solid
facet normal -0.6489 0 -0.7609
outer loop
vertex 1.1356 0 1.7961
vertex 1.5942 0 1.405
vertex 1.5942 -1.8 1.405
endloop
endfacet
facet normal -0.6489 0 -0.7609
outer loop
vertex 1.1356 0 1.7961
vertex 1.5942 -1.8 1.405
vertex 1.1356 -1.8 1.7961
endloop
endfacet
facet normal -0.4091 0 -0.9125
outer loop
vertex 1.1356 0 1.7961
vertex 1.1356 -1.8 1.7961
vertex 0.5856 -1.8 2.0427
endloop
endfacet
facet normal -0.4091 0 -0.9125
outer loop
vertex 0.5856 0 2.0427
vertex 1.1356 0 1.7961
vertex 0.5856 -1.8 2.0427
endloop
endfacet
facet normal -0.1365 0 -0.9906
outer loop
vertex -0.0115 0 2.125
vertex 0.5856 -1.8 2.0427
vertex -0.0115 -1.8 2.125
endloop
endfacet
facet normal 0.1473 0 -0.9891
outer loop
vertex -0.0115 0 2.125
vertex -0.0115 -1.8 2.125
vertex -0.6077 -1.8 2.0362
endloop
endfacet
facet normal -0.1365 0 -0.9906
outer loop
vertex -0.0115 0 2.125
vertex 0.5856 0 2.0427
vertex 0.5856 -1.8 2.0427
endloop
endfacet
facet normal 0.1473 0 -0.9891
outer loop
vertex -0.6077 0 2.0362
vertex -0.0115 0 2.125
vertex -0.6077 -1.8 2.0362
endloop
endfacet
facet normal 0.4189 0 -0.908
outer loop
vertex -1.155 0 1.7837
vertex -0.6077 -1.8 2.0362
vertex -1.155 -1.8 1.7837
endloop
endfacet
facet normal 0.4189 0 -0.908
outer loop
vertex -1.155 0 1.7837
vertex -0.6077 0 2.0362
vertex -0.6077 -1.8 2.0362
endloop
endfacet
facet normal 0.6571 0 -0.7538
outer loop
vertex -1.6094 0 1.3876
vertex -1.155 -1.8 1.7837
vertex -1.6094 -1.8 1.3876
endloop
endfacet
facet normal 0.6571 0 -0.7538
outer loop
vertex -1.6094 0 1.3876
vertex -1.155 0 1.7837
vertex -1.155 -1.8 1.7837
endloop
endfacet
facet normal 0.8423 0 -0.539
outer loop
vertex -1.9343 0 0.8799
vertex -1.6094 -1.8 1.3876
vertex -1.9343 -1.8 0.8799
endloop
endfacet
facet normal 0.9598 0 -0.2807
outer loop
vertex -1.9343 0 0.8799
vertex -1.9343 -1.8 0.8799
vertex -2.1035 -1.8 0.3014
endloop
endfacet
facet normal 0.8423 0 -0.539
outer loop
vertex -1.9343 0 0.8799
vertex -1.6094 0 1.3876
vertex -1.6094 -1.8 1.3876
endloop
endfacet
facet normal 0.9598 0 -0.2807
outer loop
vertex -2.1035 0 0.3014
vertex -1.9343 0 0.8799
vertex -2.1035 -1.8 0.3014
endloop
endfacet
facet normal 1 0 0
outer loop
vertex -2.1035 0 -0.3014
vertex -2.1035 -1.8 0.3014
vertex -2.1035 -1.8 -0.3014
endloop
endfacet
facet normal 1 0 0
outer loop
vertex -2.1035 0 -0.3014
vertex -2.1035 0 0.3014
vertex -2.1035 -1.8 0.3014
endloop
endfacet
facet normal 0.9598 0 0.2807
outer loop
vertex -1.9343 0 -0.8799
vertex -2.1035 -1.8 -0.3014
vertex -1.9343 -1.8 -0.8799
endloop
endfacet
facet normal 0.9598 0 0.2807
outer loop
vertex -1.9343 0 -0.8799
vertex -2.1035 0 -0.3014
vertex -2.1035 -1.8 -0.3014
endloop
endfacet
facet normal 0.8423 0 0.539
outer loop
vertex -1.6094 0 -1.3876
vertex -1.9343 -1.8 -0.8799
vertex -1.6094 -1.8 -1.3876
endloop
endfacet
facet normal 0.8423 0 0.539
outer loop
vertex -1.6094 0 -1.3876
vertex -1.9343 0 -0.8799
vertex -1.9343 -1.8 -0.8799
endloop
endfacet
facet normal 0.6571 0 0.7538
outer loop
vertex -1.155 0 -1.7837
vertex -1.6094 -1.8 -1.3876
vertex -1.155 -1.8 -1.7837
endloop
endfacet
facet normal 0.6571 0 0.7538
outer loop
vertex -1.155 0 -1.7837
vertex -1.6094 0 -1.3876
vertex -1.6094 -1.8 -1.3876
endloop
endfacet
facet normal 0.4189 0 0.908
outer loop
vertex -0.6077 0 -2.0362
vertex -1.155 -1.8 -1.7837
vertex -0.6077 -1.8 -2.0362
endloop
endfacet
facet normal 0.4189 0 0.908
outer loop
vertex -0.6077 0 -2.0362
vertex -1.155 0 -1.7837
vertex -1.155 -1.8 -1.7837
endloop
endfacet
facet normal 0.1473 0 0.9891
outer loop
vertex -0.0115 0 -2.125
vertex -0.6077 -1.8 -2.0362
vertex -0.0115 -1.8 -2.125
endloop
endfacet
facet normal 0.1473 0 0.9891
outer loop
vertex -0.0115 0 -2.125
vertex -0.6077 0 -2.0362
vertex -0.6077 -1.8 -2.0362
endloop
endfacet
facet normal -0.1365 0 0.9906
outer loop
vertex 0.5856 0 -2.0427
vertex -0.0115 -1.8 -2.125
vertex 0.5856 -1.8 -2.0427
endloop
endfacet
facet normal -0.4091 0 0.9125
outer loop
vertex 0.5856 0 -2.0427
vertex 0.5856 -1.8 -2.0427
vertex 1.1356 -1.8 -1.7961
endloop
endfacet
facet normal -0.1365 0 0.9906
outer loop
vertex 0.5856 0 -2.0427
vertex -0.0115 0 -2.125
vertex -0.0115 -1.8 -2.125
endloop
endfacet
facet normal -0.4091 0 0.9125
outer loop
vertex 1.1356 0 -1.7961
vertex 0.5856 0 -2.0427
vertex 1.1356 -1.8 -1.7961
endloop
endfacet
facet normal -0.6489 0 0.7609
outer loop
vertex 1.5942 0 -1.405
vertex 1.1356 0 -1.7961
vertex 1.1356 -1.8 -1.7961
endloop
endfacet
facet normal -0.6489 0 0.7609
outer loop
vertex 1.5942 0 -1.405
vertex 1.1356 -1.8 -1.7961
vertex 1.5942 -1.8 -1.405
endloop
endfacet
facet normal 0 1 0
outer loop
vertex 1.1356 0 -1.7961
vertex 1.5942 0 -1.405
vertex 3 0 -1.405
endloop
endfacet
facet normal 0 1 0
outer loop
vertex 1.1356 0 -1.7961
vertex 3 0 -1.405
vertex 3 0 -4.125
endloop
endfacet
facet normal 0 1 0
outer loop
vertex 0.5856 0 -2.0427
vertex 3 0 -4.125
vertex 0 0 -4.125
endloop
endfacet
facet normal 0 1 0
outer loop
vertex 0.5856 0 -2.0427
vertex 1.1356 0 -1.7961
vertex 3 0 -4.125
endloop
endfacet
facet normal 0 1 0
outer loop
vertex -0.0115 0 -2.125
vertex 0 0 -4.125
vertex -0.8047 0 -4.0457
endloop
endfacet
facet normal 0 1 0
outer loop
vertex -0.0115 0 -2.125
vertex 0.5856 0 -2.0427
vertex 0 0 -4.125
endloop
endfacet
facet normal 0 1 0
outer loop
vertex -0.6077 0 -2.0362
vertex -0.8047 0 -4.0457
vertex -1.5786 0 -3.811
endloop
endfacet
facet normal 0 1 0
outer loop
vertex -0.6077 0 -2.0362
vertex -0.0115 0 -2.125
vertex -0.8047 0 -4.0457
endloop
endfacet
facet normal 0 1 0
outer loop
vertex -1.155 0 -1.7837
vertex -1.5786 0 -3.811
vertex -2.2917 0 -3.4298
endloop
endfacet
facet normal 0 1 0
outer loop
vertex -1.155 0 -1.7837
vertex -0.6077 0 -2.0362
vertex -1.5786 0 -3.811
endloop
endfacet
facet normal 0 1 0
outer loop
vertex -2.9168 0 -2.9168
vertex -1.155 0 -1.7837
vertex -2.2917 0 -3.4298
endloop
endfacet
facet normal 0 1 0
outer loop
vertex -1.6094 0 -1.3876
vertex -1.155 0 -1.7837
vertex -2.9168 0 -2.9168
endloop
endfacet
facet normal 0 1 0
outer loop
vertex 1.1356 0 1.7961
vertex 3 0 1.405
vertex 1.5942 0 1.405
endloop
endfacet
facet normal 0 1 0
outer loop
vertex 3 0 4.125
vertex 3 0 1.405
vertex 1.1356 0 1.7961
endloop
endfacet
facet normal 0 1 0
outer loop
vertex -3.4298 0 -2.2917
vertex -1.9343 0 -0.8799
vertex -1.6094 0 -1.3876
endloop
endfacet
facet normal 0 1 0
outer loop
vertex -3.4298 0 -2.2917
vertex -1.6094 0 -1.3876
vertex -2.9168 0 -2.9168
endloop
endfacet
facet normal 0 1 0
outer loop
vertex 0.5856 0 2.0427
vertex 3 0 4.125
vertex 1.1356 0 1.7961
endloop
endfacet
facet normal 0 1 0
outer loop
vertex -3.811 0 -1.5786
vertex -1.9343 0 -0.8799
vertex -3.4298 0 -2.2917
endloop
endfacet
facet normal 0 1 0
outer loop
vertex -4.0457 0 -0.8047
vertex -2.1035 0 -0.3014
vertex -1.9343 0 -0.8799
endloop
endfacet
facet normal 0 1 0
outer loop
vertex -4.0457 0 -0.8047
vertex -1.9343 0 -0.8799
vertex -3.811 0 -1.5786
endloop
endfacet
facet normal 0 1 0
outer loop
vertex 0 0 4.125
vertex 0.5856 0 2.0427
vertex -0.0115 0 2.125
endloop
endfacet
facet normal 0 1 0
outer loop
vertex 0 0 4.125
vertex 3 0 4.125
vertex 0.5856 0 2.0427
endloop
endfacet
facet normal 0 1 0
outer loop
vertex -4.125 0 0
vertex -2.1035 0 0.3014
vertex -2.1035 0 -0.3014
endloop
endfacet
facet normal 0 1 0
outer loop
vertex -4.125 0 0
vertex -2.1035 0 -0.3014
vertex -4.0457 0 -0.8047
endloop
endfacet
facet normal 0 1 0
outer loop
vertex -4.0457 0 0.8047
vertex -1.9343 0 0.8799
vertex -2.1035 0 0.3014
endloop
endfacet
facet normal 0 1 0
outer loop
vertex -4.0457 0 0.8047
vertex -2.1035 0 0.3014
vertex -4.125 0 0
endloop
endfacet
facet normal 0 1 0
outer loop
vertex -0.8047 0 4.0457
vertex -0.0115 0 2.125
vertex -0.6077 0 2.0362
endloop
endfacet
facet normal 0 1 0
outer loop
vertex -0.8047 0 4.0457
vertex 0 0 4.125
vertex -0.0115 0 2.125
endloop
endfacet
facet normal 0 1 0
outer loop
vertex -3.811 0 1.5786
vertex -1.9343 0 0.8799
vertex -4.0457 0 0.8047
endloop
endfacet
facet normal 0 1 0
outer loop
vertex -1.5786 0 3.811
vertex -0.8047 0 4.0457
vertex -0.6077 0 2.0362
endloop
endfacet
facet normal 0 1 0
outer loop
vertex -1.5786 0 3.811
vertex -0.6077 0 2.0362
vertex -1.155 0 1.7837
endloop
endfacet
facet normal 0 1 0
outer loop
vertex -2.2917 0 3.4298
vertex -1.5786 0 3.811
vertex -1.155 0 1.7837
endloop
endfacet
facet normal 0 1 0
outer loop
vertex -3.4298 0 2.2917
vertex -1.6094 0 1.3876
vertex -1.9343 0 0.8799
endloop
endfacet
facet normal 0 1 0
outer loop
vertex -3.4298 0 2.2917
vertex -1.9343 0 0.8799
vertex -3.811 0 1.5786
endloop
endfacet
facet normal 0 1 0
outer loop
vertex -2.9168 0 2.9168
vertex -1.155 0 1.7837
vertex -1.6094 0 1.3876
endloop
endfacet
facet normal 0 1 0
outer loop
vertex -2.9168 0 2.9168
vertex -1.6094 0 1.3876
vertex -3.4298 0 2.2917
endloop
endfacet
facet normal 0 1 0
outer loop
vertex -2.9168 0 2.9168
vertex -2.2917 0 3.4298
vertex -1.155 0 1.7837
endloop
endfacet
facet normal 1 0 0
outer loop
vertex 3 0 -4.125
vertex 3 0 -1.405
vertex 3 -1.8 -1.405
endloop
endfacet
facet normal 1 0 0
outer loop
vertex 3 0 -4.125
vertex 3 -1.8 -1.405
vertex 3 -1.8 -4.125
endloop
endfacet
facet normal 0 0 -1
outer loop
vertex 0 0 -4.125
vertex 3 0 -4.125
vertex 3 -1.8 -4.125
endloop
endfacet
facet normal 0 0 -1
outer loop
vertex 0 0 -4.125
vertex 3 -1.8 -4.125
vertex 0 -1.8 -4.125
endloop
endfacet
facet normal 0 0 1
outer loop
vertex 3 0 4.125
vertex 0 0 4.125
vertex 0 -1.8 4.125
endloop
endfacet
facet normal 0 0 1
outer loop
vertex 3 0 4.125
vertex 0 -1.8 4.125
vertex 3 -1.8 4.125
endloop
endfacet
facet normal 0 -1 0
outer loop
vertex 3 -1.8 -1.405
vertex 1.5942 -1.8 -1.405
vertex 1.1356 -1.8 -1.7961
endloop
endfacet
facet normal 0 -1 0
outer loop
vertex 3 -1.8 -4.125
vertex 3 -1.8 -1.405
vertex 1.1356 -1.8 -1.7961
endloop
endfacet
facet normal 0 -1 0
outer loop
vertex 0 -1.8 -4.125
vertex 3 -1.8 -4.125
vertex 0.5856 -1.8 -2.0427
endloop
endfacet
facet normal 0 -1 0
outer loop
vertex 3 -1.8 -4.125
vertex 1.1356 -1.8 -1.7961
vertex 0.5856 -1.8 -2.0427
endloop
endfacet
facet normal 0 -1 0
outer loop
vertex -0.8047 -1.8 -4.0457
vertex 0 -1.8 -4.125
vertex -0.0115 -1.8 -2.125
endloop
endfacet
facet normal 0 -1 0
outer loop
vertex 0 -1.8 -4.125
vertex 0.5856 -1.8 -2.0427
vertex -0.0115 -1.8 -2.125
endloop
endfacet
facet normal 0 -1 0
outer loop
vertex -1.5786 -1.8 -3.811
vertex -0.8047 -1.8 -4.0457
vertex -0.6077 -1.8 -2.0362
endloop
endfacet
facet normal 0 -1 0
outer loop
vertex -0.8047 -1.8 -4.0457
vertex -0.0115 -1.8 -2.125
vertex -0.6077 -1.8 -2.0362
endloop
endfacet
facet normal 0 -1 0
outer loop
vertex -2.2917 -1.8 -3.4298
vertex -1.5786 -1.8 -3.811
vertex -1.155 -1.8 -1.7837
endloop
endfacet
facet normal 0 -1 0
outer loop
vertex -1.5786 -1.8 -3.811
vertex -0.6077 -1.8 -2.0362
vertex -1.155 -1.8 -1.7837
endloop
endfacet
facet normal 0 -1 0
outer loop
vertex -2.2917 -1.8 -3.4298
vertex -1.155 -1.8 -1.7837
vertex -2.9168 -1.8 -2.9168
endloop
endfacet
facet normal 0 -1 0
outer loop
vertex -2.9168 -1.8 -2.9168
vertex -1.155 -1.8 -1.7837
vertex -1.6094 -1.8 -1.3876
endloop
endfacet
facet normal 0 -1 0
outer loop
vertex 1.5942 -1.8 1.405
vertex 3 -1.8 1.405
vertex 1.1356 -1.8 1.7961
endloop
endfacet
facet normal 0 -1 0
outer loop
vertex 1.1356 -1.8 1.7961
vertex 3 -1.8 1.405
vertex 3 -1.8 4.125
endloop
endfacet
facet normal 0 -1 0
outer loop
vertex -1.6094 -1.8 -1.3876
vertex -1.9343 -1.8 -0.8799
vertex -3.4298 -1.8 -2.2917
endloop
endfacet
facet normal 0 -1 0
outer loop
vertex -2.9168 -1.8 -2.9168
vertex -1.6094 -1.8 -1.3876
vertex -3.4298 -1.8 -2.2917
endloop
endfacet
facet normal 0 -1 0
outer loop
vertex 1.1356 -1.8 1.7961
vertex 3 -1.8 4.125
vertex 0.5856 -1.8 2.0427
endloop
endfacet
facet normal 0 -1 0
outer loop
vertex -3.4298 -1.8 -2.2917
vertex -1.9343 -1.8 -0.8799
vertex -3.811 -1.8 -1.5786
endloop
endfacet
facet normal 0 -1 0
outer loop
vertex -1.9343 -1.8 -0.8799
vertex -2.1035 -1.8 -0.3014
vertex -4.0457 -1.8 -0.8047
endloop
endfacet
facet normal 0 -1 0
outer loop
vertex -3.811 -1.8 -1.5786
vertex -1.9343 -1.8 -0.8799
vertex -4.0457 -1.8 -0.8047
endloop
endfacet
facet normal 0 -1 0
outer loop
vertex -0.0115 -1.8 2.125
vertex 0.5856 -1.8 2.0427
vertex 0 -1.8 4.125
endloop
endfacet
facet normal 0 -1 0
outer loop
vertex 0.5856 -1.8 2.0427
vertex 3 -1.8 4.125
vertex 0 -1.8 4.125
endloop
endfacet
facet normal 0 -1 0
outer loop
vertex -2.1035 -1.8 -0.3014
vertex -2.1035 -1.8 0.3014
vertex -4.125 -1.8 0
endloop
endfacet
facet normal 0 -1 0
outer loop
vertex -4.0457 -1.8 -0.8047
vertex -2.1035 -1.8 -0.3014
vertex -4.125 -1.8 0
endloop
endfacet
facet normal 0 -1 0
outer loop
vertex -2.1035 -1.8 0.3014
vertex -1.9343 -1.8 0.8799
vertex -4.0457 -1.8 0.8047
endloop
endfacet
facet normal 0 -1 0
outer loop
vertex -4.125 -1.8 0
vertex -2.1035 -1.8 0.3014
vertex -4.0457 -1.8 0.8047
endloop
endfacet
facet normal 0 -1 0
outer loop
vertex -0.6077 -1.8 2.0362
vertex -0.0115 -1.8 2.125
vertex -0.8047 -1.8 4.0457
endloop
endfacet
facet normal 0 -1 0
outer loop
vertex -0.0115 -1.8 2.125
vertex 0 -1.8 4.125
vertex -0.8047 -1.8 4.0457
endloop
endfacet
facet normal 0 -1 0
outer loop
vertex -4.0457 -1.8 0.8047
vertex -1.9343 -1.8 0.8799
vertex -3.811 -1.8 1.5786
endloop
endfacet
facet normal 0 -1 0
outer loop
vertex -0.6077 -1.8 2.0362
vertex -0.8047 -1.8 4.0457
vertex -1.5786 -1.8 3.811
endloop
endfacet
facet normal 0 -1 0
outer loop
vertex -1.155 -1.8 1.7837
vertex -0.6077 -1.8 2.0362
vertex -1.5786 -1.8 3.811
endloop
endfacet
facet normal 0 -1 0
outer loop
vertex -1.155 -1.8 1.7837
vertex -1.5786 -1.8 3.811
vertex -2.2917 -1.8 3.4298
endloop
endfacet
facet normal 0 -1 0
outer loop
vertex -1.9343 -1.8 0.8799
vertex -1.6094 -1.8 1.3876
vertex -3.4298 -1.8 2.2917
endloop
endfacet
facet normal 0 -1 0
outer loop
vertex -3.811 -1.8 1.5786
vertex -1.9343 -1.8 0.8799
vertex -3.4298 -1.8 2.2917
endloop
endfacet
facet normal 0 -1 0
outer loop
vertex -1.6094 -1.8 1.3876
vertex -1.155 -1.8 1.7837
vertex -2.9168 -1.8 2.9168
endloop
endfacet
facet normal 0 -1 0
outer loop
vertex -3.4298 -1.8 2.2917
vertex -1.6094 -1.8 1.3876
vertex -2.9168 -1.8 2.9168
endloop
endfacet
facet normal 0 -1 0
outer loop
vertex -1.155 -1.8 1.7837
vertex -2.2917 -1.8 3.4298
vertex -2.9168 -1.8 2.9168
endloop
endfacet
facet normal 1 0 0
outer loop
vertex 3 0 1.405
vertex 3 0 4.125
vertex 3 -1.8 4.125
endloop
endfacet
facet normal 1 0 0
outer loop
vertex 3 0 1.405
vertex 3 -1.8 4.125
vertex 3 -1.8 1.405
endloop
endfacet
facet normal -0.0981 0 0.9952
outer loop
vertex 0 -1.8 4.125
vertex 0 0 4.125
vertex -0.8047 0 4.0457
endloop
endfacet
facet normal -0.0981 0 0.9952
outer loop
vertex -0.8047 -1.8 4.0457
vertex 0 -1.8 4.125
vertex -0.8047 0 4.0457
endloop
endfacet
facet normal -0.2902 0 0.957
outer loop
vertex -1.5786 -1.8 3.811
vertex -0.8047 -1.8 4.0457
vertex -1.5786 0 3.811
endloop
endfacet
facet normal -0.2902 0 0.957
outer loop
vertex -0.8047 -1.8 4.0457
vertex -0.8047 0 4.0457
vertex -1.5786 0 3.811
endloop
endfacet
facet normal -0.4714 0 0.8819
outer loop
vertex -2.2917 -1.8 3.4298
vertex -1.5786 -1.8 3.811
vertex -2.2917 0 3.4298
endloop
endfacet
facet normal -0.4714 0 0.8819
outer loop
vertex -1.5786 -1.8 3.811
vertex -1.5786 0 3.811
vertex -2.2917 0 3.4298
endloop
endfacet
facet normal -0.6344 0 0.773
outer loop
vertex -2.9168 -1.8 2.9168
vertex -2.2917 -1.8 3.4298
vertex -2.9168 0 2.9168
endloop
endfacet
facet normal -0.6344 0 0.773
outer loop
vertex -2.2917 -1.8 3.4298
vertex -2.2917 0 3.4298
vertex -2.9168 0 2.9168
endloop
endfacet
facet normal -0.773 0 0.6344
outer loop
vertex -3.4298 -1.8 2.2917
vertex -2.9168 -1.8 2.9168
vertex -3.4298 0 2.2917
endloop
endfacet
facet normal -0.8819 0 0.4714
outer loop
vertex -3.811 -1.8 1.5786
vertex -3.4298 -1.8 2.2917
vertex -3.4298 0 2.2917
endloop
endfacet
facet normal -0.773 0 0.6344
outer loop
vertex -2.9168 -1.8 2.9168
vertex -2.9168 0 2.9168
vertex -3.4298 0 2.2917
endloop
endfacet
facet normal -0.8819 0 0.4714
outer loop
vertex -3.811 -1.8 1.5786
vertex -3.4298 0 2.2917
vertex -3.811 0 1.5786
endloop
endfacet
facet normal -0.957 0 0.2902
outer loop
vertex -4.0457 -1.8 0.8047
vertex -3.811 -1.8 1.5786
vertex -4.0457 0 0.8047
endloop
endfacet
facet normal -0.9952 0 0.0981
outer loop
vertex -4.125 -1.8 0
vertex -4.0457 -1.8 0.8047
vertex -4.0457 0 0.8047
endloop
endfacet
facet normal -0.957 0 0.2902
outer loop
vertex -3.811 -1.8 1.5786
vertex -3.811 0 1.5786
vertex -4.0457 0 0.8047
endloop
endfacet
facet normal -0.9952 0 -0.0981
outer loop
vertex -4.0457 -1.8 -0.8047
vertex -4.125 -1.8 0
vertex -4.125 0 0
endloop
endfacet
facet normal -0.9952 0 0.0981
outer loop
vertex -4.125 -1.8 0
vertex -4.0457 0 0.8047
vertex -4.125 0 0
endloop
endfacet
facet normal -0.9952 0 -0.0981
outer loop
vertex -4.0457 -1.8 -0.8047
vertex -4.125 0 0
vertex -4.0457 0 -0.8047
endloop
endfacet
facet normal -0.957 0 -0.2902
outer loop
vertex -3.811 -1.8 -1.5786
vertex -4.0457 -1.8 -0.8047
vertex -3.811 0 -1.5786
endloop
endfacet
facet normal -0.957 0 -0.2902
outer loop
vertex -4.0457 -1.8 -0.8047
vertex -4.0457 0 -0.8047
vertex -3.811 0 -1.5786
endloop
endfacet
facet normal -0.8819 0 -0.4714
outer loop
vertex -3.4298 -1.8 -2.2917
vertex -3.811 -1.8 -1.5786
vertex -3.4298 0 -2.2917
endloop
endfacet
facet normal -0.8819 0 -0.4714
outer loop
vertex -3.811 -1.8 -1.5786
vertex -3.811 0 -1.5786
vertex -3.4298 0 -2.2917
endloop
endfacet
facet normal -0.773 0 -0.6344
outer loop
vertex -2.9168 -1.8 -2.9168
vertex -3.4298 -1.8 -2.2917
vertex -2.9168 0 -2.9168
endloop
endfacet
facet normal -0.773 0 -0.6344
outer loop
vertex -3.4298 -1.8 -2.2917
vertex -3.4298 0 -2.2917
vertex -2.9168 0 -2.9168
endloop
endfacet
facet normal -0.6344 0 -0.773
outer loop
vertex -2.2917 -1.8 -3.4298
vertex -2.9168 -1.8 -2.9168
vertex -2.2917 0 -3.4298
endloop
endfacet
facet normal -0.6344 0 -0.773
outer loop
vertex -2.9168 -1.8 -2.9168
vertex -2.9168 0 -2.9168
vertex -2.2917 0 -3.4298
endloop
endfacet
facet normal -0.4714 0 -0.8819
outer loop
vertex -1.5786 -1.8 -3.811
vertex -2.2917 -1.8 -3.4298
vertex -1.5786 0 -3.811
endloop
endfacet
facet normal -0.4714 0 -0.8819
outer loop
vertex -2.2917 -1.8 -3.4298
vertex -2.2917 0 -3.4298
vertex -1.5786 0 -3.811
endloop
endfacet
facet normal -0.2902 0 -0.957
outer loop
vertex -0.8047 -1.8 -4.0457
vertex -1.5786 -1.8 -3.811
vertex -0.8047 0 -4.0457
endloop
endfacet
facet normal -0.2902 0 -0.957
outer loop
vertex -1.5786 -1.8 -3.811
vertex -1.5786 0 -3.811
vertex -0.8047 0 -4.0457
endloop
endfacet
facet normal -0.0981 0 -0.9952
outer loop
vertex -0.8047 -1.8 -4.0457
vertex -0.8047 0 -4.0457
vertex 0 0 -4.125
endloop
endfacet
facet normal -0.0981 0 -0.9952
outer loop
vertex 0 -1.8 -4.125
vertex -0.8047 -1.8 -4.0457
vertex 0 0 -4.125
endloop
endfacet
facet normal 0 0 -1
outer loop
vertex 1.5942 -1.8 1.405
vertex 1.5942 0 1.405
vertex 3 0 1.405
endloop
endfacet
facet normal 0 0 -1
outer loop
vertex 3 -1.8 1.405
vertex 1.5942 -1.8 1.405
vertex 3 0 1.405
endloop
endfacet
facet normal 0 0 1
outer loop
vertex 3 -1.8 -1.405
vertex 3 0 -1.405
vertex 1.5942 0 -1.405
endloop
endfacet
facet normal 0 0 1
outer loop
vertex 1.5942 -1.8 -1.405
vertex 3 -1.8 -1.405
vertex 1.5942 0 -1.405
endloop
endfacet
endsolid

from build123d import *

# Parameters (mm, degrees)
PAD_DEPTH = 1.8


with BuildPart() as part:
    # Sketch → Pad (new body)
    with BuildSketch(Plane.XZ):
        with BuildLine():
            ThreePointArc((1.59424, 1.405), (-2.125, 0), (1.59424, -1.405))
            Line((3, -1.405), (1.59424, -1.405))
            Line((3, -1.405), (3, -4.125))
            Line((3, -4.125), (0, -4.125))
            ThreePointArc((0, 4.125), (-4.125, 0), (0, -4.125))
            Line((0, 4.125), (3, 4.125))
            Line((3, 4.125), (3, 1.405))
            Line((1.59424, 1.405), (3, 1.405))
        make_face()
    extrude(amount=PAD_DEPTH)


solid = part.part
